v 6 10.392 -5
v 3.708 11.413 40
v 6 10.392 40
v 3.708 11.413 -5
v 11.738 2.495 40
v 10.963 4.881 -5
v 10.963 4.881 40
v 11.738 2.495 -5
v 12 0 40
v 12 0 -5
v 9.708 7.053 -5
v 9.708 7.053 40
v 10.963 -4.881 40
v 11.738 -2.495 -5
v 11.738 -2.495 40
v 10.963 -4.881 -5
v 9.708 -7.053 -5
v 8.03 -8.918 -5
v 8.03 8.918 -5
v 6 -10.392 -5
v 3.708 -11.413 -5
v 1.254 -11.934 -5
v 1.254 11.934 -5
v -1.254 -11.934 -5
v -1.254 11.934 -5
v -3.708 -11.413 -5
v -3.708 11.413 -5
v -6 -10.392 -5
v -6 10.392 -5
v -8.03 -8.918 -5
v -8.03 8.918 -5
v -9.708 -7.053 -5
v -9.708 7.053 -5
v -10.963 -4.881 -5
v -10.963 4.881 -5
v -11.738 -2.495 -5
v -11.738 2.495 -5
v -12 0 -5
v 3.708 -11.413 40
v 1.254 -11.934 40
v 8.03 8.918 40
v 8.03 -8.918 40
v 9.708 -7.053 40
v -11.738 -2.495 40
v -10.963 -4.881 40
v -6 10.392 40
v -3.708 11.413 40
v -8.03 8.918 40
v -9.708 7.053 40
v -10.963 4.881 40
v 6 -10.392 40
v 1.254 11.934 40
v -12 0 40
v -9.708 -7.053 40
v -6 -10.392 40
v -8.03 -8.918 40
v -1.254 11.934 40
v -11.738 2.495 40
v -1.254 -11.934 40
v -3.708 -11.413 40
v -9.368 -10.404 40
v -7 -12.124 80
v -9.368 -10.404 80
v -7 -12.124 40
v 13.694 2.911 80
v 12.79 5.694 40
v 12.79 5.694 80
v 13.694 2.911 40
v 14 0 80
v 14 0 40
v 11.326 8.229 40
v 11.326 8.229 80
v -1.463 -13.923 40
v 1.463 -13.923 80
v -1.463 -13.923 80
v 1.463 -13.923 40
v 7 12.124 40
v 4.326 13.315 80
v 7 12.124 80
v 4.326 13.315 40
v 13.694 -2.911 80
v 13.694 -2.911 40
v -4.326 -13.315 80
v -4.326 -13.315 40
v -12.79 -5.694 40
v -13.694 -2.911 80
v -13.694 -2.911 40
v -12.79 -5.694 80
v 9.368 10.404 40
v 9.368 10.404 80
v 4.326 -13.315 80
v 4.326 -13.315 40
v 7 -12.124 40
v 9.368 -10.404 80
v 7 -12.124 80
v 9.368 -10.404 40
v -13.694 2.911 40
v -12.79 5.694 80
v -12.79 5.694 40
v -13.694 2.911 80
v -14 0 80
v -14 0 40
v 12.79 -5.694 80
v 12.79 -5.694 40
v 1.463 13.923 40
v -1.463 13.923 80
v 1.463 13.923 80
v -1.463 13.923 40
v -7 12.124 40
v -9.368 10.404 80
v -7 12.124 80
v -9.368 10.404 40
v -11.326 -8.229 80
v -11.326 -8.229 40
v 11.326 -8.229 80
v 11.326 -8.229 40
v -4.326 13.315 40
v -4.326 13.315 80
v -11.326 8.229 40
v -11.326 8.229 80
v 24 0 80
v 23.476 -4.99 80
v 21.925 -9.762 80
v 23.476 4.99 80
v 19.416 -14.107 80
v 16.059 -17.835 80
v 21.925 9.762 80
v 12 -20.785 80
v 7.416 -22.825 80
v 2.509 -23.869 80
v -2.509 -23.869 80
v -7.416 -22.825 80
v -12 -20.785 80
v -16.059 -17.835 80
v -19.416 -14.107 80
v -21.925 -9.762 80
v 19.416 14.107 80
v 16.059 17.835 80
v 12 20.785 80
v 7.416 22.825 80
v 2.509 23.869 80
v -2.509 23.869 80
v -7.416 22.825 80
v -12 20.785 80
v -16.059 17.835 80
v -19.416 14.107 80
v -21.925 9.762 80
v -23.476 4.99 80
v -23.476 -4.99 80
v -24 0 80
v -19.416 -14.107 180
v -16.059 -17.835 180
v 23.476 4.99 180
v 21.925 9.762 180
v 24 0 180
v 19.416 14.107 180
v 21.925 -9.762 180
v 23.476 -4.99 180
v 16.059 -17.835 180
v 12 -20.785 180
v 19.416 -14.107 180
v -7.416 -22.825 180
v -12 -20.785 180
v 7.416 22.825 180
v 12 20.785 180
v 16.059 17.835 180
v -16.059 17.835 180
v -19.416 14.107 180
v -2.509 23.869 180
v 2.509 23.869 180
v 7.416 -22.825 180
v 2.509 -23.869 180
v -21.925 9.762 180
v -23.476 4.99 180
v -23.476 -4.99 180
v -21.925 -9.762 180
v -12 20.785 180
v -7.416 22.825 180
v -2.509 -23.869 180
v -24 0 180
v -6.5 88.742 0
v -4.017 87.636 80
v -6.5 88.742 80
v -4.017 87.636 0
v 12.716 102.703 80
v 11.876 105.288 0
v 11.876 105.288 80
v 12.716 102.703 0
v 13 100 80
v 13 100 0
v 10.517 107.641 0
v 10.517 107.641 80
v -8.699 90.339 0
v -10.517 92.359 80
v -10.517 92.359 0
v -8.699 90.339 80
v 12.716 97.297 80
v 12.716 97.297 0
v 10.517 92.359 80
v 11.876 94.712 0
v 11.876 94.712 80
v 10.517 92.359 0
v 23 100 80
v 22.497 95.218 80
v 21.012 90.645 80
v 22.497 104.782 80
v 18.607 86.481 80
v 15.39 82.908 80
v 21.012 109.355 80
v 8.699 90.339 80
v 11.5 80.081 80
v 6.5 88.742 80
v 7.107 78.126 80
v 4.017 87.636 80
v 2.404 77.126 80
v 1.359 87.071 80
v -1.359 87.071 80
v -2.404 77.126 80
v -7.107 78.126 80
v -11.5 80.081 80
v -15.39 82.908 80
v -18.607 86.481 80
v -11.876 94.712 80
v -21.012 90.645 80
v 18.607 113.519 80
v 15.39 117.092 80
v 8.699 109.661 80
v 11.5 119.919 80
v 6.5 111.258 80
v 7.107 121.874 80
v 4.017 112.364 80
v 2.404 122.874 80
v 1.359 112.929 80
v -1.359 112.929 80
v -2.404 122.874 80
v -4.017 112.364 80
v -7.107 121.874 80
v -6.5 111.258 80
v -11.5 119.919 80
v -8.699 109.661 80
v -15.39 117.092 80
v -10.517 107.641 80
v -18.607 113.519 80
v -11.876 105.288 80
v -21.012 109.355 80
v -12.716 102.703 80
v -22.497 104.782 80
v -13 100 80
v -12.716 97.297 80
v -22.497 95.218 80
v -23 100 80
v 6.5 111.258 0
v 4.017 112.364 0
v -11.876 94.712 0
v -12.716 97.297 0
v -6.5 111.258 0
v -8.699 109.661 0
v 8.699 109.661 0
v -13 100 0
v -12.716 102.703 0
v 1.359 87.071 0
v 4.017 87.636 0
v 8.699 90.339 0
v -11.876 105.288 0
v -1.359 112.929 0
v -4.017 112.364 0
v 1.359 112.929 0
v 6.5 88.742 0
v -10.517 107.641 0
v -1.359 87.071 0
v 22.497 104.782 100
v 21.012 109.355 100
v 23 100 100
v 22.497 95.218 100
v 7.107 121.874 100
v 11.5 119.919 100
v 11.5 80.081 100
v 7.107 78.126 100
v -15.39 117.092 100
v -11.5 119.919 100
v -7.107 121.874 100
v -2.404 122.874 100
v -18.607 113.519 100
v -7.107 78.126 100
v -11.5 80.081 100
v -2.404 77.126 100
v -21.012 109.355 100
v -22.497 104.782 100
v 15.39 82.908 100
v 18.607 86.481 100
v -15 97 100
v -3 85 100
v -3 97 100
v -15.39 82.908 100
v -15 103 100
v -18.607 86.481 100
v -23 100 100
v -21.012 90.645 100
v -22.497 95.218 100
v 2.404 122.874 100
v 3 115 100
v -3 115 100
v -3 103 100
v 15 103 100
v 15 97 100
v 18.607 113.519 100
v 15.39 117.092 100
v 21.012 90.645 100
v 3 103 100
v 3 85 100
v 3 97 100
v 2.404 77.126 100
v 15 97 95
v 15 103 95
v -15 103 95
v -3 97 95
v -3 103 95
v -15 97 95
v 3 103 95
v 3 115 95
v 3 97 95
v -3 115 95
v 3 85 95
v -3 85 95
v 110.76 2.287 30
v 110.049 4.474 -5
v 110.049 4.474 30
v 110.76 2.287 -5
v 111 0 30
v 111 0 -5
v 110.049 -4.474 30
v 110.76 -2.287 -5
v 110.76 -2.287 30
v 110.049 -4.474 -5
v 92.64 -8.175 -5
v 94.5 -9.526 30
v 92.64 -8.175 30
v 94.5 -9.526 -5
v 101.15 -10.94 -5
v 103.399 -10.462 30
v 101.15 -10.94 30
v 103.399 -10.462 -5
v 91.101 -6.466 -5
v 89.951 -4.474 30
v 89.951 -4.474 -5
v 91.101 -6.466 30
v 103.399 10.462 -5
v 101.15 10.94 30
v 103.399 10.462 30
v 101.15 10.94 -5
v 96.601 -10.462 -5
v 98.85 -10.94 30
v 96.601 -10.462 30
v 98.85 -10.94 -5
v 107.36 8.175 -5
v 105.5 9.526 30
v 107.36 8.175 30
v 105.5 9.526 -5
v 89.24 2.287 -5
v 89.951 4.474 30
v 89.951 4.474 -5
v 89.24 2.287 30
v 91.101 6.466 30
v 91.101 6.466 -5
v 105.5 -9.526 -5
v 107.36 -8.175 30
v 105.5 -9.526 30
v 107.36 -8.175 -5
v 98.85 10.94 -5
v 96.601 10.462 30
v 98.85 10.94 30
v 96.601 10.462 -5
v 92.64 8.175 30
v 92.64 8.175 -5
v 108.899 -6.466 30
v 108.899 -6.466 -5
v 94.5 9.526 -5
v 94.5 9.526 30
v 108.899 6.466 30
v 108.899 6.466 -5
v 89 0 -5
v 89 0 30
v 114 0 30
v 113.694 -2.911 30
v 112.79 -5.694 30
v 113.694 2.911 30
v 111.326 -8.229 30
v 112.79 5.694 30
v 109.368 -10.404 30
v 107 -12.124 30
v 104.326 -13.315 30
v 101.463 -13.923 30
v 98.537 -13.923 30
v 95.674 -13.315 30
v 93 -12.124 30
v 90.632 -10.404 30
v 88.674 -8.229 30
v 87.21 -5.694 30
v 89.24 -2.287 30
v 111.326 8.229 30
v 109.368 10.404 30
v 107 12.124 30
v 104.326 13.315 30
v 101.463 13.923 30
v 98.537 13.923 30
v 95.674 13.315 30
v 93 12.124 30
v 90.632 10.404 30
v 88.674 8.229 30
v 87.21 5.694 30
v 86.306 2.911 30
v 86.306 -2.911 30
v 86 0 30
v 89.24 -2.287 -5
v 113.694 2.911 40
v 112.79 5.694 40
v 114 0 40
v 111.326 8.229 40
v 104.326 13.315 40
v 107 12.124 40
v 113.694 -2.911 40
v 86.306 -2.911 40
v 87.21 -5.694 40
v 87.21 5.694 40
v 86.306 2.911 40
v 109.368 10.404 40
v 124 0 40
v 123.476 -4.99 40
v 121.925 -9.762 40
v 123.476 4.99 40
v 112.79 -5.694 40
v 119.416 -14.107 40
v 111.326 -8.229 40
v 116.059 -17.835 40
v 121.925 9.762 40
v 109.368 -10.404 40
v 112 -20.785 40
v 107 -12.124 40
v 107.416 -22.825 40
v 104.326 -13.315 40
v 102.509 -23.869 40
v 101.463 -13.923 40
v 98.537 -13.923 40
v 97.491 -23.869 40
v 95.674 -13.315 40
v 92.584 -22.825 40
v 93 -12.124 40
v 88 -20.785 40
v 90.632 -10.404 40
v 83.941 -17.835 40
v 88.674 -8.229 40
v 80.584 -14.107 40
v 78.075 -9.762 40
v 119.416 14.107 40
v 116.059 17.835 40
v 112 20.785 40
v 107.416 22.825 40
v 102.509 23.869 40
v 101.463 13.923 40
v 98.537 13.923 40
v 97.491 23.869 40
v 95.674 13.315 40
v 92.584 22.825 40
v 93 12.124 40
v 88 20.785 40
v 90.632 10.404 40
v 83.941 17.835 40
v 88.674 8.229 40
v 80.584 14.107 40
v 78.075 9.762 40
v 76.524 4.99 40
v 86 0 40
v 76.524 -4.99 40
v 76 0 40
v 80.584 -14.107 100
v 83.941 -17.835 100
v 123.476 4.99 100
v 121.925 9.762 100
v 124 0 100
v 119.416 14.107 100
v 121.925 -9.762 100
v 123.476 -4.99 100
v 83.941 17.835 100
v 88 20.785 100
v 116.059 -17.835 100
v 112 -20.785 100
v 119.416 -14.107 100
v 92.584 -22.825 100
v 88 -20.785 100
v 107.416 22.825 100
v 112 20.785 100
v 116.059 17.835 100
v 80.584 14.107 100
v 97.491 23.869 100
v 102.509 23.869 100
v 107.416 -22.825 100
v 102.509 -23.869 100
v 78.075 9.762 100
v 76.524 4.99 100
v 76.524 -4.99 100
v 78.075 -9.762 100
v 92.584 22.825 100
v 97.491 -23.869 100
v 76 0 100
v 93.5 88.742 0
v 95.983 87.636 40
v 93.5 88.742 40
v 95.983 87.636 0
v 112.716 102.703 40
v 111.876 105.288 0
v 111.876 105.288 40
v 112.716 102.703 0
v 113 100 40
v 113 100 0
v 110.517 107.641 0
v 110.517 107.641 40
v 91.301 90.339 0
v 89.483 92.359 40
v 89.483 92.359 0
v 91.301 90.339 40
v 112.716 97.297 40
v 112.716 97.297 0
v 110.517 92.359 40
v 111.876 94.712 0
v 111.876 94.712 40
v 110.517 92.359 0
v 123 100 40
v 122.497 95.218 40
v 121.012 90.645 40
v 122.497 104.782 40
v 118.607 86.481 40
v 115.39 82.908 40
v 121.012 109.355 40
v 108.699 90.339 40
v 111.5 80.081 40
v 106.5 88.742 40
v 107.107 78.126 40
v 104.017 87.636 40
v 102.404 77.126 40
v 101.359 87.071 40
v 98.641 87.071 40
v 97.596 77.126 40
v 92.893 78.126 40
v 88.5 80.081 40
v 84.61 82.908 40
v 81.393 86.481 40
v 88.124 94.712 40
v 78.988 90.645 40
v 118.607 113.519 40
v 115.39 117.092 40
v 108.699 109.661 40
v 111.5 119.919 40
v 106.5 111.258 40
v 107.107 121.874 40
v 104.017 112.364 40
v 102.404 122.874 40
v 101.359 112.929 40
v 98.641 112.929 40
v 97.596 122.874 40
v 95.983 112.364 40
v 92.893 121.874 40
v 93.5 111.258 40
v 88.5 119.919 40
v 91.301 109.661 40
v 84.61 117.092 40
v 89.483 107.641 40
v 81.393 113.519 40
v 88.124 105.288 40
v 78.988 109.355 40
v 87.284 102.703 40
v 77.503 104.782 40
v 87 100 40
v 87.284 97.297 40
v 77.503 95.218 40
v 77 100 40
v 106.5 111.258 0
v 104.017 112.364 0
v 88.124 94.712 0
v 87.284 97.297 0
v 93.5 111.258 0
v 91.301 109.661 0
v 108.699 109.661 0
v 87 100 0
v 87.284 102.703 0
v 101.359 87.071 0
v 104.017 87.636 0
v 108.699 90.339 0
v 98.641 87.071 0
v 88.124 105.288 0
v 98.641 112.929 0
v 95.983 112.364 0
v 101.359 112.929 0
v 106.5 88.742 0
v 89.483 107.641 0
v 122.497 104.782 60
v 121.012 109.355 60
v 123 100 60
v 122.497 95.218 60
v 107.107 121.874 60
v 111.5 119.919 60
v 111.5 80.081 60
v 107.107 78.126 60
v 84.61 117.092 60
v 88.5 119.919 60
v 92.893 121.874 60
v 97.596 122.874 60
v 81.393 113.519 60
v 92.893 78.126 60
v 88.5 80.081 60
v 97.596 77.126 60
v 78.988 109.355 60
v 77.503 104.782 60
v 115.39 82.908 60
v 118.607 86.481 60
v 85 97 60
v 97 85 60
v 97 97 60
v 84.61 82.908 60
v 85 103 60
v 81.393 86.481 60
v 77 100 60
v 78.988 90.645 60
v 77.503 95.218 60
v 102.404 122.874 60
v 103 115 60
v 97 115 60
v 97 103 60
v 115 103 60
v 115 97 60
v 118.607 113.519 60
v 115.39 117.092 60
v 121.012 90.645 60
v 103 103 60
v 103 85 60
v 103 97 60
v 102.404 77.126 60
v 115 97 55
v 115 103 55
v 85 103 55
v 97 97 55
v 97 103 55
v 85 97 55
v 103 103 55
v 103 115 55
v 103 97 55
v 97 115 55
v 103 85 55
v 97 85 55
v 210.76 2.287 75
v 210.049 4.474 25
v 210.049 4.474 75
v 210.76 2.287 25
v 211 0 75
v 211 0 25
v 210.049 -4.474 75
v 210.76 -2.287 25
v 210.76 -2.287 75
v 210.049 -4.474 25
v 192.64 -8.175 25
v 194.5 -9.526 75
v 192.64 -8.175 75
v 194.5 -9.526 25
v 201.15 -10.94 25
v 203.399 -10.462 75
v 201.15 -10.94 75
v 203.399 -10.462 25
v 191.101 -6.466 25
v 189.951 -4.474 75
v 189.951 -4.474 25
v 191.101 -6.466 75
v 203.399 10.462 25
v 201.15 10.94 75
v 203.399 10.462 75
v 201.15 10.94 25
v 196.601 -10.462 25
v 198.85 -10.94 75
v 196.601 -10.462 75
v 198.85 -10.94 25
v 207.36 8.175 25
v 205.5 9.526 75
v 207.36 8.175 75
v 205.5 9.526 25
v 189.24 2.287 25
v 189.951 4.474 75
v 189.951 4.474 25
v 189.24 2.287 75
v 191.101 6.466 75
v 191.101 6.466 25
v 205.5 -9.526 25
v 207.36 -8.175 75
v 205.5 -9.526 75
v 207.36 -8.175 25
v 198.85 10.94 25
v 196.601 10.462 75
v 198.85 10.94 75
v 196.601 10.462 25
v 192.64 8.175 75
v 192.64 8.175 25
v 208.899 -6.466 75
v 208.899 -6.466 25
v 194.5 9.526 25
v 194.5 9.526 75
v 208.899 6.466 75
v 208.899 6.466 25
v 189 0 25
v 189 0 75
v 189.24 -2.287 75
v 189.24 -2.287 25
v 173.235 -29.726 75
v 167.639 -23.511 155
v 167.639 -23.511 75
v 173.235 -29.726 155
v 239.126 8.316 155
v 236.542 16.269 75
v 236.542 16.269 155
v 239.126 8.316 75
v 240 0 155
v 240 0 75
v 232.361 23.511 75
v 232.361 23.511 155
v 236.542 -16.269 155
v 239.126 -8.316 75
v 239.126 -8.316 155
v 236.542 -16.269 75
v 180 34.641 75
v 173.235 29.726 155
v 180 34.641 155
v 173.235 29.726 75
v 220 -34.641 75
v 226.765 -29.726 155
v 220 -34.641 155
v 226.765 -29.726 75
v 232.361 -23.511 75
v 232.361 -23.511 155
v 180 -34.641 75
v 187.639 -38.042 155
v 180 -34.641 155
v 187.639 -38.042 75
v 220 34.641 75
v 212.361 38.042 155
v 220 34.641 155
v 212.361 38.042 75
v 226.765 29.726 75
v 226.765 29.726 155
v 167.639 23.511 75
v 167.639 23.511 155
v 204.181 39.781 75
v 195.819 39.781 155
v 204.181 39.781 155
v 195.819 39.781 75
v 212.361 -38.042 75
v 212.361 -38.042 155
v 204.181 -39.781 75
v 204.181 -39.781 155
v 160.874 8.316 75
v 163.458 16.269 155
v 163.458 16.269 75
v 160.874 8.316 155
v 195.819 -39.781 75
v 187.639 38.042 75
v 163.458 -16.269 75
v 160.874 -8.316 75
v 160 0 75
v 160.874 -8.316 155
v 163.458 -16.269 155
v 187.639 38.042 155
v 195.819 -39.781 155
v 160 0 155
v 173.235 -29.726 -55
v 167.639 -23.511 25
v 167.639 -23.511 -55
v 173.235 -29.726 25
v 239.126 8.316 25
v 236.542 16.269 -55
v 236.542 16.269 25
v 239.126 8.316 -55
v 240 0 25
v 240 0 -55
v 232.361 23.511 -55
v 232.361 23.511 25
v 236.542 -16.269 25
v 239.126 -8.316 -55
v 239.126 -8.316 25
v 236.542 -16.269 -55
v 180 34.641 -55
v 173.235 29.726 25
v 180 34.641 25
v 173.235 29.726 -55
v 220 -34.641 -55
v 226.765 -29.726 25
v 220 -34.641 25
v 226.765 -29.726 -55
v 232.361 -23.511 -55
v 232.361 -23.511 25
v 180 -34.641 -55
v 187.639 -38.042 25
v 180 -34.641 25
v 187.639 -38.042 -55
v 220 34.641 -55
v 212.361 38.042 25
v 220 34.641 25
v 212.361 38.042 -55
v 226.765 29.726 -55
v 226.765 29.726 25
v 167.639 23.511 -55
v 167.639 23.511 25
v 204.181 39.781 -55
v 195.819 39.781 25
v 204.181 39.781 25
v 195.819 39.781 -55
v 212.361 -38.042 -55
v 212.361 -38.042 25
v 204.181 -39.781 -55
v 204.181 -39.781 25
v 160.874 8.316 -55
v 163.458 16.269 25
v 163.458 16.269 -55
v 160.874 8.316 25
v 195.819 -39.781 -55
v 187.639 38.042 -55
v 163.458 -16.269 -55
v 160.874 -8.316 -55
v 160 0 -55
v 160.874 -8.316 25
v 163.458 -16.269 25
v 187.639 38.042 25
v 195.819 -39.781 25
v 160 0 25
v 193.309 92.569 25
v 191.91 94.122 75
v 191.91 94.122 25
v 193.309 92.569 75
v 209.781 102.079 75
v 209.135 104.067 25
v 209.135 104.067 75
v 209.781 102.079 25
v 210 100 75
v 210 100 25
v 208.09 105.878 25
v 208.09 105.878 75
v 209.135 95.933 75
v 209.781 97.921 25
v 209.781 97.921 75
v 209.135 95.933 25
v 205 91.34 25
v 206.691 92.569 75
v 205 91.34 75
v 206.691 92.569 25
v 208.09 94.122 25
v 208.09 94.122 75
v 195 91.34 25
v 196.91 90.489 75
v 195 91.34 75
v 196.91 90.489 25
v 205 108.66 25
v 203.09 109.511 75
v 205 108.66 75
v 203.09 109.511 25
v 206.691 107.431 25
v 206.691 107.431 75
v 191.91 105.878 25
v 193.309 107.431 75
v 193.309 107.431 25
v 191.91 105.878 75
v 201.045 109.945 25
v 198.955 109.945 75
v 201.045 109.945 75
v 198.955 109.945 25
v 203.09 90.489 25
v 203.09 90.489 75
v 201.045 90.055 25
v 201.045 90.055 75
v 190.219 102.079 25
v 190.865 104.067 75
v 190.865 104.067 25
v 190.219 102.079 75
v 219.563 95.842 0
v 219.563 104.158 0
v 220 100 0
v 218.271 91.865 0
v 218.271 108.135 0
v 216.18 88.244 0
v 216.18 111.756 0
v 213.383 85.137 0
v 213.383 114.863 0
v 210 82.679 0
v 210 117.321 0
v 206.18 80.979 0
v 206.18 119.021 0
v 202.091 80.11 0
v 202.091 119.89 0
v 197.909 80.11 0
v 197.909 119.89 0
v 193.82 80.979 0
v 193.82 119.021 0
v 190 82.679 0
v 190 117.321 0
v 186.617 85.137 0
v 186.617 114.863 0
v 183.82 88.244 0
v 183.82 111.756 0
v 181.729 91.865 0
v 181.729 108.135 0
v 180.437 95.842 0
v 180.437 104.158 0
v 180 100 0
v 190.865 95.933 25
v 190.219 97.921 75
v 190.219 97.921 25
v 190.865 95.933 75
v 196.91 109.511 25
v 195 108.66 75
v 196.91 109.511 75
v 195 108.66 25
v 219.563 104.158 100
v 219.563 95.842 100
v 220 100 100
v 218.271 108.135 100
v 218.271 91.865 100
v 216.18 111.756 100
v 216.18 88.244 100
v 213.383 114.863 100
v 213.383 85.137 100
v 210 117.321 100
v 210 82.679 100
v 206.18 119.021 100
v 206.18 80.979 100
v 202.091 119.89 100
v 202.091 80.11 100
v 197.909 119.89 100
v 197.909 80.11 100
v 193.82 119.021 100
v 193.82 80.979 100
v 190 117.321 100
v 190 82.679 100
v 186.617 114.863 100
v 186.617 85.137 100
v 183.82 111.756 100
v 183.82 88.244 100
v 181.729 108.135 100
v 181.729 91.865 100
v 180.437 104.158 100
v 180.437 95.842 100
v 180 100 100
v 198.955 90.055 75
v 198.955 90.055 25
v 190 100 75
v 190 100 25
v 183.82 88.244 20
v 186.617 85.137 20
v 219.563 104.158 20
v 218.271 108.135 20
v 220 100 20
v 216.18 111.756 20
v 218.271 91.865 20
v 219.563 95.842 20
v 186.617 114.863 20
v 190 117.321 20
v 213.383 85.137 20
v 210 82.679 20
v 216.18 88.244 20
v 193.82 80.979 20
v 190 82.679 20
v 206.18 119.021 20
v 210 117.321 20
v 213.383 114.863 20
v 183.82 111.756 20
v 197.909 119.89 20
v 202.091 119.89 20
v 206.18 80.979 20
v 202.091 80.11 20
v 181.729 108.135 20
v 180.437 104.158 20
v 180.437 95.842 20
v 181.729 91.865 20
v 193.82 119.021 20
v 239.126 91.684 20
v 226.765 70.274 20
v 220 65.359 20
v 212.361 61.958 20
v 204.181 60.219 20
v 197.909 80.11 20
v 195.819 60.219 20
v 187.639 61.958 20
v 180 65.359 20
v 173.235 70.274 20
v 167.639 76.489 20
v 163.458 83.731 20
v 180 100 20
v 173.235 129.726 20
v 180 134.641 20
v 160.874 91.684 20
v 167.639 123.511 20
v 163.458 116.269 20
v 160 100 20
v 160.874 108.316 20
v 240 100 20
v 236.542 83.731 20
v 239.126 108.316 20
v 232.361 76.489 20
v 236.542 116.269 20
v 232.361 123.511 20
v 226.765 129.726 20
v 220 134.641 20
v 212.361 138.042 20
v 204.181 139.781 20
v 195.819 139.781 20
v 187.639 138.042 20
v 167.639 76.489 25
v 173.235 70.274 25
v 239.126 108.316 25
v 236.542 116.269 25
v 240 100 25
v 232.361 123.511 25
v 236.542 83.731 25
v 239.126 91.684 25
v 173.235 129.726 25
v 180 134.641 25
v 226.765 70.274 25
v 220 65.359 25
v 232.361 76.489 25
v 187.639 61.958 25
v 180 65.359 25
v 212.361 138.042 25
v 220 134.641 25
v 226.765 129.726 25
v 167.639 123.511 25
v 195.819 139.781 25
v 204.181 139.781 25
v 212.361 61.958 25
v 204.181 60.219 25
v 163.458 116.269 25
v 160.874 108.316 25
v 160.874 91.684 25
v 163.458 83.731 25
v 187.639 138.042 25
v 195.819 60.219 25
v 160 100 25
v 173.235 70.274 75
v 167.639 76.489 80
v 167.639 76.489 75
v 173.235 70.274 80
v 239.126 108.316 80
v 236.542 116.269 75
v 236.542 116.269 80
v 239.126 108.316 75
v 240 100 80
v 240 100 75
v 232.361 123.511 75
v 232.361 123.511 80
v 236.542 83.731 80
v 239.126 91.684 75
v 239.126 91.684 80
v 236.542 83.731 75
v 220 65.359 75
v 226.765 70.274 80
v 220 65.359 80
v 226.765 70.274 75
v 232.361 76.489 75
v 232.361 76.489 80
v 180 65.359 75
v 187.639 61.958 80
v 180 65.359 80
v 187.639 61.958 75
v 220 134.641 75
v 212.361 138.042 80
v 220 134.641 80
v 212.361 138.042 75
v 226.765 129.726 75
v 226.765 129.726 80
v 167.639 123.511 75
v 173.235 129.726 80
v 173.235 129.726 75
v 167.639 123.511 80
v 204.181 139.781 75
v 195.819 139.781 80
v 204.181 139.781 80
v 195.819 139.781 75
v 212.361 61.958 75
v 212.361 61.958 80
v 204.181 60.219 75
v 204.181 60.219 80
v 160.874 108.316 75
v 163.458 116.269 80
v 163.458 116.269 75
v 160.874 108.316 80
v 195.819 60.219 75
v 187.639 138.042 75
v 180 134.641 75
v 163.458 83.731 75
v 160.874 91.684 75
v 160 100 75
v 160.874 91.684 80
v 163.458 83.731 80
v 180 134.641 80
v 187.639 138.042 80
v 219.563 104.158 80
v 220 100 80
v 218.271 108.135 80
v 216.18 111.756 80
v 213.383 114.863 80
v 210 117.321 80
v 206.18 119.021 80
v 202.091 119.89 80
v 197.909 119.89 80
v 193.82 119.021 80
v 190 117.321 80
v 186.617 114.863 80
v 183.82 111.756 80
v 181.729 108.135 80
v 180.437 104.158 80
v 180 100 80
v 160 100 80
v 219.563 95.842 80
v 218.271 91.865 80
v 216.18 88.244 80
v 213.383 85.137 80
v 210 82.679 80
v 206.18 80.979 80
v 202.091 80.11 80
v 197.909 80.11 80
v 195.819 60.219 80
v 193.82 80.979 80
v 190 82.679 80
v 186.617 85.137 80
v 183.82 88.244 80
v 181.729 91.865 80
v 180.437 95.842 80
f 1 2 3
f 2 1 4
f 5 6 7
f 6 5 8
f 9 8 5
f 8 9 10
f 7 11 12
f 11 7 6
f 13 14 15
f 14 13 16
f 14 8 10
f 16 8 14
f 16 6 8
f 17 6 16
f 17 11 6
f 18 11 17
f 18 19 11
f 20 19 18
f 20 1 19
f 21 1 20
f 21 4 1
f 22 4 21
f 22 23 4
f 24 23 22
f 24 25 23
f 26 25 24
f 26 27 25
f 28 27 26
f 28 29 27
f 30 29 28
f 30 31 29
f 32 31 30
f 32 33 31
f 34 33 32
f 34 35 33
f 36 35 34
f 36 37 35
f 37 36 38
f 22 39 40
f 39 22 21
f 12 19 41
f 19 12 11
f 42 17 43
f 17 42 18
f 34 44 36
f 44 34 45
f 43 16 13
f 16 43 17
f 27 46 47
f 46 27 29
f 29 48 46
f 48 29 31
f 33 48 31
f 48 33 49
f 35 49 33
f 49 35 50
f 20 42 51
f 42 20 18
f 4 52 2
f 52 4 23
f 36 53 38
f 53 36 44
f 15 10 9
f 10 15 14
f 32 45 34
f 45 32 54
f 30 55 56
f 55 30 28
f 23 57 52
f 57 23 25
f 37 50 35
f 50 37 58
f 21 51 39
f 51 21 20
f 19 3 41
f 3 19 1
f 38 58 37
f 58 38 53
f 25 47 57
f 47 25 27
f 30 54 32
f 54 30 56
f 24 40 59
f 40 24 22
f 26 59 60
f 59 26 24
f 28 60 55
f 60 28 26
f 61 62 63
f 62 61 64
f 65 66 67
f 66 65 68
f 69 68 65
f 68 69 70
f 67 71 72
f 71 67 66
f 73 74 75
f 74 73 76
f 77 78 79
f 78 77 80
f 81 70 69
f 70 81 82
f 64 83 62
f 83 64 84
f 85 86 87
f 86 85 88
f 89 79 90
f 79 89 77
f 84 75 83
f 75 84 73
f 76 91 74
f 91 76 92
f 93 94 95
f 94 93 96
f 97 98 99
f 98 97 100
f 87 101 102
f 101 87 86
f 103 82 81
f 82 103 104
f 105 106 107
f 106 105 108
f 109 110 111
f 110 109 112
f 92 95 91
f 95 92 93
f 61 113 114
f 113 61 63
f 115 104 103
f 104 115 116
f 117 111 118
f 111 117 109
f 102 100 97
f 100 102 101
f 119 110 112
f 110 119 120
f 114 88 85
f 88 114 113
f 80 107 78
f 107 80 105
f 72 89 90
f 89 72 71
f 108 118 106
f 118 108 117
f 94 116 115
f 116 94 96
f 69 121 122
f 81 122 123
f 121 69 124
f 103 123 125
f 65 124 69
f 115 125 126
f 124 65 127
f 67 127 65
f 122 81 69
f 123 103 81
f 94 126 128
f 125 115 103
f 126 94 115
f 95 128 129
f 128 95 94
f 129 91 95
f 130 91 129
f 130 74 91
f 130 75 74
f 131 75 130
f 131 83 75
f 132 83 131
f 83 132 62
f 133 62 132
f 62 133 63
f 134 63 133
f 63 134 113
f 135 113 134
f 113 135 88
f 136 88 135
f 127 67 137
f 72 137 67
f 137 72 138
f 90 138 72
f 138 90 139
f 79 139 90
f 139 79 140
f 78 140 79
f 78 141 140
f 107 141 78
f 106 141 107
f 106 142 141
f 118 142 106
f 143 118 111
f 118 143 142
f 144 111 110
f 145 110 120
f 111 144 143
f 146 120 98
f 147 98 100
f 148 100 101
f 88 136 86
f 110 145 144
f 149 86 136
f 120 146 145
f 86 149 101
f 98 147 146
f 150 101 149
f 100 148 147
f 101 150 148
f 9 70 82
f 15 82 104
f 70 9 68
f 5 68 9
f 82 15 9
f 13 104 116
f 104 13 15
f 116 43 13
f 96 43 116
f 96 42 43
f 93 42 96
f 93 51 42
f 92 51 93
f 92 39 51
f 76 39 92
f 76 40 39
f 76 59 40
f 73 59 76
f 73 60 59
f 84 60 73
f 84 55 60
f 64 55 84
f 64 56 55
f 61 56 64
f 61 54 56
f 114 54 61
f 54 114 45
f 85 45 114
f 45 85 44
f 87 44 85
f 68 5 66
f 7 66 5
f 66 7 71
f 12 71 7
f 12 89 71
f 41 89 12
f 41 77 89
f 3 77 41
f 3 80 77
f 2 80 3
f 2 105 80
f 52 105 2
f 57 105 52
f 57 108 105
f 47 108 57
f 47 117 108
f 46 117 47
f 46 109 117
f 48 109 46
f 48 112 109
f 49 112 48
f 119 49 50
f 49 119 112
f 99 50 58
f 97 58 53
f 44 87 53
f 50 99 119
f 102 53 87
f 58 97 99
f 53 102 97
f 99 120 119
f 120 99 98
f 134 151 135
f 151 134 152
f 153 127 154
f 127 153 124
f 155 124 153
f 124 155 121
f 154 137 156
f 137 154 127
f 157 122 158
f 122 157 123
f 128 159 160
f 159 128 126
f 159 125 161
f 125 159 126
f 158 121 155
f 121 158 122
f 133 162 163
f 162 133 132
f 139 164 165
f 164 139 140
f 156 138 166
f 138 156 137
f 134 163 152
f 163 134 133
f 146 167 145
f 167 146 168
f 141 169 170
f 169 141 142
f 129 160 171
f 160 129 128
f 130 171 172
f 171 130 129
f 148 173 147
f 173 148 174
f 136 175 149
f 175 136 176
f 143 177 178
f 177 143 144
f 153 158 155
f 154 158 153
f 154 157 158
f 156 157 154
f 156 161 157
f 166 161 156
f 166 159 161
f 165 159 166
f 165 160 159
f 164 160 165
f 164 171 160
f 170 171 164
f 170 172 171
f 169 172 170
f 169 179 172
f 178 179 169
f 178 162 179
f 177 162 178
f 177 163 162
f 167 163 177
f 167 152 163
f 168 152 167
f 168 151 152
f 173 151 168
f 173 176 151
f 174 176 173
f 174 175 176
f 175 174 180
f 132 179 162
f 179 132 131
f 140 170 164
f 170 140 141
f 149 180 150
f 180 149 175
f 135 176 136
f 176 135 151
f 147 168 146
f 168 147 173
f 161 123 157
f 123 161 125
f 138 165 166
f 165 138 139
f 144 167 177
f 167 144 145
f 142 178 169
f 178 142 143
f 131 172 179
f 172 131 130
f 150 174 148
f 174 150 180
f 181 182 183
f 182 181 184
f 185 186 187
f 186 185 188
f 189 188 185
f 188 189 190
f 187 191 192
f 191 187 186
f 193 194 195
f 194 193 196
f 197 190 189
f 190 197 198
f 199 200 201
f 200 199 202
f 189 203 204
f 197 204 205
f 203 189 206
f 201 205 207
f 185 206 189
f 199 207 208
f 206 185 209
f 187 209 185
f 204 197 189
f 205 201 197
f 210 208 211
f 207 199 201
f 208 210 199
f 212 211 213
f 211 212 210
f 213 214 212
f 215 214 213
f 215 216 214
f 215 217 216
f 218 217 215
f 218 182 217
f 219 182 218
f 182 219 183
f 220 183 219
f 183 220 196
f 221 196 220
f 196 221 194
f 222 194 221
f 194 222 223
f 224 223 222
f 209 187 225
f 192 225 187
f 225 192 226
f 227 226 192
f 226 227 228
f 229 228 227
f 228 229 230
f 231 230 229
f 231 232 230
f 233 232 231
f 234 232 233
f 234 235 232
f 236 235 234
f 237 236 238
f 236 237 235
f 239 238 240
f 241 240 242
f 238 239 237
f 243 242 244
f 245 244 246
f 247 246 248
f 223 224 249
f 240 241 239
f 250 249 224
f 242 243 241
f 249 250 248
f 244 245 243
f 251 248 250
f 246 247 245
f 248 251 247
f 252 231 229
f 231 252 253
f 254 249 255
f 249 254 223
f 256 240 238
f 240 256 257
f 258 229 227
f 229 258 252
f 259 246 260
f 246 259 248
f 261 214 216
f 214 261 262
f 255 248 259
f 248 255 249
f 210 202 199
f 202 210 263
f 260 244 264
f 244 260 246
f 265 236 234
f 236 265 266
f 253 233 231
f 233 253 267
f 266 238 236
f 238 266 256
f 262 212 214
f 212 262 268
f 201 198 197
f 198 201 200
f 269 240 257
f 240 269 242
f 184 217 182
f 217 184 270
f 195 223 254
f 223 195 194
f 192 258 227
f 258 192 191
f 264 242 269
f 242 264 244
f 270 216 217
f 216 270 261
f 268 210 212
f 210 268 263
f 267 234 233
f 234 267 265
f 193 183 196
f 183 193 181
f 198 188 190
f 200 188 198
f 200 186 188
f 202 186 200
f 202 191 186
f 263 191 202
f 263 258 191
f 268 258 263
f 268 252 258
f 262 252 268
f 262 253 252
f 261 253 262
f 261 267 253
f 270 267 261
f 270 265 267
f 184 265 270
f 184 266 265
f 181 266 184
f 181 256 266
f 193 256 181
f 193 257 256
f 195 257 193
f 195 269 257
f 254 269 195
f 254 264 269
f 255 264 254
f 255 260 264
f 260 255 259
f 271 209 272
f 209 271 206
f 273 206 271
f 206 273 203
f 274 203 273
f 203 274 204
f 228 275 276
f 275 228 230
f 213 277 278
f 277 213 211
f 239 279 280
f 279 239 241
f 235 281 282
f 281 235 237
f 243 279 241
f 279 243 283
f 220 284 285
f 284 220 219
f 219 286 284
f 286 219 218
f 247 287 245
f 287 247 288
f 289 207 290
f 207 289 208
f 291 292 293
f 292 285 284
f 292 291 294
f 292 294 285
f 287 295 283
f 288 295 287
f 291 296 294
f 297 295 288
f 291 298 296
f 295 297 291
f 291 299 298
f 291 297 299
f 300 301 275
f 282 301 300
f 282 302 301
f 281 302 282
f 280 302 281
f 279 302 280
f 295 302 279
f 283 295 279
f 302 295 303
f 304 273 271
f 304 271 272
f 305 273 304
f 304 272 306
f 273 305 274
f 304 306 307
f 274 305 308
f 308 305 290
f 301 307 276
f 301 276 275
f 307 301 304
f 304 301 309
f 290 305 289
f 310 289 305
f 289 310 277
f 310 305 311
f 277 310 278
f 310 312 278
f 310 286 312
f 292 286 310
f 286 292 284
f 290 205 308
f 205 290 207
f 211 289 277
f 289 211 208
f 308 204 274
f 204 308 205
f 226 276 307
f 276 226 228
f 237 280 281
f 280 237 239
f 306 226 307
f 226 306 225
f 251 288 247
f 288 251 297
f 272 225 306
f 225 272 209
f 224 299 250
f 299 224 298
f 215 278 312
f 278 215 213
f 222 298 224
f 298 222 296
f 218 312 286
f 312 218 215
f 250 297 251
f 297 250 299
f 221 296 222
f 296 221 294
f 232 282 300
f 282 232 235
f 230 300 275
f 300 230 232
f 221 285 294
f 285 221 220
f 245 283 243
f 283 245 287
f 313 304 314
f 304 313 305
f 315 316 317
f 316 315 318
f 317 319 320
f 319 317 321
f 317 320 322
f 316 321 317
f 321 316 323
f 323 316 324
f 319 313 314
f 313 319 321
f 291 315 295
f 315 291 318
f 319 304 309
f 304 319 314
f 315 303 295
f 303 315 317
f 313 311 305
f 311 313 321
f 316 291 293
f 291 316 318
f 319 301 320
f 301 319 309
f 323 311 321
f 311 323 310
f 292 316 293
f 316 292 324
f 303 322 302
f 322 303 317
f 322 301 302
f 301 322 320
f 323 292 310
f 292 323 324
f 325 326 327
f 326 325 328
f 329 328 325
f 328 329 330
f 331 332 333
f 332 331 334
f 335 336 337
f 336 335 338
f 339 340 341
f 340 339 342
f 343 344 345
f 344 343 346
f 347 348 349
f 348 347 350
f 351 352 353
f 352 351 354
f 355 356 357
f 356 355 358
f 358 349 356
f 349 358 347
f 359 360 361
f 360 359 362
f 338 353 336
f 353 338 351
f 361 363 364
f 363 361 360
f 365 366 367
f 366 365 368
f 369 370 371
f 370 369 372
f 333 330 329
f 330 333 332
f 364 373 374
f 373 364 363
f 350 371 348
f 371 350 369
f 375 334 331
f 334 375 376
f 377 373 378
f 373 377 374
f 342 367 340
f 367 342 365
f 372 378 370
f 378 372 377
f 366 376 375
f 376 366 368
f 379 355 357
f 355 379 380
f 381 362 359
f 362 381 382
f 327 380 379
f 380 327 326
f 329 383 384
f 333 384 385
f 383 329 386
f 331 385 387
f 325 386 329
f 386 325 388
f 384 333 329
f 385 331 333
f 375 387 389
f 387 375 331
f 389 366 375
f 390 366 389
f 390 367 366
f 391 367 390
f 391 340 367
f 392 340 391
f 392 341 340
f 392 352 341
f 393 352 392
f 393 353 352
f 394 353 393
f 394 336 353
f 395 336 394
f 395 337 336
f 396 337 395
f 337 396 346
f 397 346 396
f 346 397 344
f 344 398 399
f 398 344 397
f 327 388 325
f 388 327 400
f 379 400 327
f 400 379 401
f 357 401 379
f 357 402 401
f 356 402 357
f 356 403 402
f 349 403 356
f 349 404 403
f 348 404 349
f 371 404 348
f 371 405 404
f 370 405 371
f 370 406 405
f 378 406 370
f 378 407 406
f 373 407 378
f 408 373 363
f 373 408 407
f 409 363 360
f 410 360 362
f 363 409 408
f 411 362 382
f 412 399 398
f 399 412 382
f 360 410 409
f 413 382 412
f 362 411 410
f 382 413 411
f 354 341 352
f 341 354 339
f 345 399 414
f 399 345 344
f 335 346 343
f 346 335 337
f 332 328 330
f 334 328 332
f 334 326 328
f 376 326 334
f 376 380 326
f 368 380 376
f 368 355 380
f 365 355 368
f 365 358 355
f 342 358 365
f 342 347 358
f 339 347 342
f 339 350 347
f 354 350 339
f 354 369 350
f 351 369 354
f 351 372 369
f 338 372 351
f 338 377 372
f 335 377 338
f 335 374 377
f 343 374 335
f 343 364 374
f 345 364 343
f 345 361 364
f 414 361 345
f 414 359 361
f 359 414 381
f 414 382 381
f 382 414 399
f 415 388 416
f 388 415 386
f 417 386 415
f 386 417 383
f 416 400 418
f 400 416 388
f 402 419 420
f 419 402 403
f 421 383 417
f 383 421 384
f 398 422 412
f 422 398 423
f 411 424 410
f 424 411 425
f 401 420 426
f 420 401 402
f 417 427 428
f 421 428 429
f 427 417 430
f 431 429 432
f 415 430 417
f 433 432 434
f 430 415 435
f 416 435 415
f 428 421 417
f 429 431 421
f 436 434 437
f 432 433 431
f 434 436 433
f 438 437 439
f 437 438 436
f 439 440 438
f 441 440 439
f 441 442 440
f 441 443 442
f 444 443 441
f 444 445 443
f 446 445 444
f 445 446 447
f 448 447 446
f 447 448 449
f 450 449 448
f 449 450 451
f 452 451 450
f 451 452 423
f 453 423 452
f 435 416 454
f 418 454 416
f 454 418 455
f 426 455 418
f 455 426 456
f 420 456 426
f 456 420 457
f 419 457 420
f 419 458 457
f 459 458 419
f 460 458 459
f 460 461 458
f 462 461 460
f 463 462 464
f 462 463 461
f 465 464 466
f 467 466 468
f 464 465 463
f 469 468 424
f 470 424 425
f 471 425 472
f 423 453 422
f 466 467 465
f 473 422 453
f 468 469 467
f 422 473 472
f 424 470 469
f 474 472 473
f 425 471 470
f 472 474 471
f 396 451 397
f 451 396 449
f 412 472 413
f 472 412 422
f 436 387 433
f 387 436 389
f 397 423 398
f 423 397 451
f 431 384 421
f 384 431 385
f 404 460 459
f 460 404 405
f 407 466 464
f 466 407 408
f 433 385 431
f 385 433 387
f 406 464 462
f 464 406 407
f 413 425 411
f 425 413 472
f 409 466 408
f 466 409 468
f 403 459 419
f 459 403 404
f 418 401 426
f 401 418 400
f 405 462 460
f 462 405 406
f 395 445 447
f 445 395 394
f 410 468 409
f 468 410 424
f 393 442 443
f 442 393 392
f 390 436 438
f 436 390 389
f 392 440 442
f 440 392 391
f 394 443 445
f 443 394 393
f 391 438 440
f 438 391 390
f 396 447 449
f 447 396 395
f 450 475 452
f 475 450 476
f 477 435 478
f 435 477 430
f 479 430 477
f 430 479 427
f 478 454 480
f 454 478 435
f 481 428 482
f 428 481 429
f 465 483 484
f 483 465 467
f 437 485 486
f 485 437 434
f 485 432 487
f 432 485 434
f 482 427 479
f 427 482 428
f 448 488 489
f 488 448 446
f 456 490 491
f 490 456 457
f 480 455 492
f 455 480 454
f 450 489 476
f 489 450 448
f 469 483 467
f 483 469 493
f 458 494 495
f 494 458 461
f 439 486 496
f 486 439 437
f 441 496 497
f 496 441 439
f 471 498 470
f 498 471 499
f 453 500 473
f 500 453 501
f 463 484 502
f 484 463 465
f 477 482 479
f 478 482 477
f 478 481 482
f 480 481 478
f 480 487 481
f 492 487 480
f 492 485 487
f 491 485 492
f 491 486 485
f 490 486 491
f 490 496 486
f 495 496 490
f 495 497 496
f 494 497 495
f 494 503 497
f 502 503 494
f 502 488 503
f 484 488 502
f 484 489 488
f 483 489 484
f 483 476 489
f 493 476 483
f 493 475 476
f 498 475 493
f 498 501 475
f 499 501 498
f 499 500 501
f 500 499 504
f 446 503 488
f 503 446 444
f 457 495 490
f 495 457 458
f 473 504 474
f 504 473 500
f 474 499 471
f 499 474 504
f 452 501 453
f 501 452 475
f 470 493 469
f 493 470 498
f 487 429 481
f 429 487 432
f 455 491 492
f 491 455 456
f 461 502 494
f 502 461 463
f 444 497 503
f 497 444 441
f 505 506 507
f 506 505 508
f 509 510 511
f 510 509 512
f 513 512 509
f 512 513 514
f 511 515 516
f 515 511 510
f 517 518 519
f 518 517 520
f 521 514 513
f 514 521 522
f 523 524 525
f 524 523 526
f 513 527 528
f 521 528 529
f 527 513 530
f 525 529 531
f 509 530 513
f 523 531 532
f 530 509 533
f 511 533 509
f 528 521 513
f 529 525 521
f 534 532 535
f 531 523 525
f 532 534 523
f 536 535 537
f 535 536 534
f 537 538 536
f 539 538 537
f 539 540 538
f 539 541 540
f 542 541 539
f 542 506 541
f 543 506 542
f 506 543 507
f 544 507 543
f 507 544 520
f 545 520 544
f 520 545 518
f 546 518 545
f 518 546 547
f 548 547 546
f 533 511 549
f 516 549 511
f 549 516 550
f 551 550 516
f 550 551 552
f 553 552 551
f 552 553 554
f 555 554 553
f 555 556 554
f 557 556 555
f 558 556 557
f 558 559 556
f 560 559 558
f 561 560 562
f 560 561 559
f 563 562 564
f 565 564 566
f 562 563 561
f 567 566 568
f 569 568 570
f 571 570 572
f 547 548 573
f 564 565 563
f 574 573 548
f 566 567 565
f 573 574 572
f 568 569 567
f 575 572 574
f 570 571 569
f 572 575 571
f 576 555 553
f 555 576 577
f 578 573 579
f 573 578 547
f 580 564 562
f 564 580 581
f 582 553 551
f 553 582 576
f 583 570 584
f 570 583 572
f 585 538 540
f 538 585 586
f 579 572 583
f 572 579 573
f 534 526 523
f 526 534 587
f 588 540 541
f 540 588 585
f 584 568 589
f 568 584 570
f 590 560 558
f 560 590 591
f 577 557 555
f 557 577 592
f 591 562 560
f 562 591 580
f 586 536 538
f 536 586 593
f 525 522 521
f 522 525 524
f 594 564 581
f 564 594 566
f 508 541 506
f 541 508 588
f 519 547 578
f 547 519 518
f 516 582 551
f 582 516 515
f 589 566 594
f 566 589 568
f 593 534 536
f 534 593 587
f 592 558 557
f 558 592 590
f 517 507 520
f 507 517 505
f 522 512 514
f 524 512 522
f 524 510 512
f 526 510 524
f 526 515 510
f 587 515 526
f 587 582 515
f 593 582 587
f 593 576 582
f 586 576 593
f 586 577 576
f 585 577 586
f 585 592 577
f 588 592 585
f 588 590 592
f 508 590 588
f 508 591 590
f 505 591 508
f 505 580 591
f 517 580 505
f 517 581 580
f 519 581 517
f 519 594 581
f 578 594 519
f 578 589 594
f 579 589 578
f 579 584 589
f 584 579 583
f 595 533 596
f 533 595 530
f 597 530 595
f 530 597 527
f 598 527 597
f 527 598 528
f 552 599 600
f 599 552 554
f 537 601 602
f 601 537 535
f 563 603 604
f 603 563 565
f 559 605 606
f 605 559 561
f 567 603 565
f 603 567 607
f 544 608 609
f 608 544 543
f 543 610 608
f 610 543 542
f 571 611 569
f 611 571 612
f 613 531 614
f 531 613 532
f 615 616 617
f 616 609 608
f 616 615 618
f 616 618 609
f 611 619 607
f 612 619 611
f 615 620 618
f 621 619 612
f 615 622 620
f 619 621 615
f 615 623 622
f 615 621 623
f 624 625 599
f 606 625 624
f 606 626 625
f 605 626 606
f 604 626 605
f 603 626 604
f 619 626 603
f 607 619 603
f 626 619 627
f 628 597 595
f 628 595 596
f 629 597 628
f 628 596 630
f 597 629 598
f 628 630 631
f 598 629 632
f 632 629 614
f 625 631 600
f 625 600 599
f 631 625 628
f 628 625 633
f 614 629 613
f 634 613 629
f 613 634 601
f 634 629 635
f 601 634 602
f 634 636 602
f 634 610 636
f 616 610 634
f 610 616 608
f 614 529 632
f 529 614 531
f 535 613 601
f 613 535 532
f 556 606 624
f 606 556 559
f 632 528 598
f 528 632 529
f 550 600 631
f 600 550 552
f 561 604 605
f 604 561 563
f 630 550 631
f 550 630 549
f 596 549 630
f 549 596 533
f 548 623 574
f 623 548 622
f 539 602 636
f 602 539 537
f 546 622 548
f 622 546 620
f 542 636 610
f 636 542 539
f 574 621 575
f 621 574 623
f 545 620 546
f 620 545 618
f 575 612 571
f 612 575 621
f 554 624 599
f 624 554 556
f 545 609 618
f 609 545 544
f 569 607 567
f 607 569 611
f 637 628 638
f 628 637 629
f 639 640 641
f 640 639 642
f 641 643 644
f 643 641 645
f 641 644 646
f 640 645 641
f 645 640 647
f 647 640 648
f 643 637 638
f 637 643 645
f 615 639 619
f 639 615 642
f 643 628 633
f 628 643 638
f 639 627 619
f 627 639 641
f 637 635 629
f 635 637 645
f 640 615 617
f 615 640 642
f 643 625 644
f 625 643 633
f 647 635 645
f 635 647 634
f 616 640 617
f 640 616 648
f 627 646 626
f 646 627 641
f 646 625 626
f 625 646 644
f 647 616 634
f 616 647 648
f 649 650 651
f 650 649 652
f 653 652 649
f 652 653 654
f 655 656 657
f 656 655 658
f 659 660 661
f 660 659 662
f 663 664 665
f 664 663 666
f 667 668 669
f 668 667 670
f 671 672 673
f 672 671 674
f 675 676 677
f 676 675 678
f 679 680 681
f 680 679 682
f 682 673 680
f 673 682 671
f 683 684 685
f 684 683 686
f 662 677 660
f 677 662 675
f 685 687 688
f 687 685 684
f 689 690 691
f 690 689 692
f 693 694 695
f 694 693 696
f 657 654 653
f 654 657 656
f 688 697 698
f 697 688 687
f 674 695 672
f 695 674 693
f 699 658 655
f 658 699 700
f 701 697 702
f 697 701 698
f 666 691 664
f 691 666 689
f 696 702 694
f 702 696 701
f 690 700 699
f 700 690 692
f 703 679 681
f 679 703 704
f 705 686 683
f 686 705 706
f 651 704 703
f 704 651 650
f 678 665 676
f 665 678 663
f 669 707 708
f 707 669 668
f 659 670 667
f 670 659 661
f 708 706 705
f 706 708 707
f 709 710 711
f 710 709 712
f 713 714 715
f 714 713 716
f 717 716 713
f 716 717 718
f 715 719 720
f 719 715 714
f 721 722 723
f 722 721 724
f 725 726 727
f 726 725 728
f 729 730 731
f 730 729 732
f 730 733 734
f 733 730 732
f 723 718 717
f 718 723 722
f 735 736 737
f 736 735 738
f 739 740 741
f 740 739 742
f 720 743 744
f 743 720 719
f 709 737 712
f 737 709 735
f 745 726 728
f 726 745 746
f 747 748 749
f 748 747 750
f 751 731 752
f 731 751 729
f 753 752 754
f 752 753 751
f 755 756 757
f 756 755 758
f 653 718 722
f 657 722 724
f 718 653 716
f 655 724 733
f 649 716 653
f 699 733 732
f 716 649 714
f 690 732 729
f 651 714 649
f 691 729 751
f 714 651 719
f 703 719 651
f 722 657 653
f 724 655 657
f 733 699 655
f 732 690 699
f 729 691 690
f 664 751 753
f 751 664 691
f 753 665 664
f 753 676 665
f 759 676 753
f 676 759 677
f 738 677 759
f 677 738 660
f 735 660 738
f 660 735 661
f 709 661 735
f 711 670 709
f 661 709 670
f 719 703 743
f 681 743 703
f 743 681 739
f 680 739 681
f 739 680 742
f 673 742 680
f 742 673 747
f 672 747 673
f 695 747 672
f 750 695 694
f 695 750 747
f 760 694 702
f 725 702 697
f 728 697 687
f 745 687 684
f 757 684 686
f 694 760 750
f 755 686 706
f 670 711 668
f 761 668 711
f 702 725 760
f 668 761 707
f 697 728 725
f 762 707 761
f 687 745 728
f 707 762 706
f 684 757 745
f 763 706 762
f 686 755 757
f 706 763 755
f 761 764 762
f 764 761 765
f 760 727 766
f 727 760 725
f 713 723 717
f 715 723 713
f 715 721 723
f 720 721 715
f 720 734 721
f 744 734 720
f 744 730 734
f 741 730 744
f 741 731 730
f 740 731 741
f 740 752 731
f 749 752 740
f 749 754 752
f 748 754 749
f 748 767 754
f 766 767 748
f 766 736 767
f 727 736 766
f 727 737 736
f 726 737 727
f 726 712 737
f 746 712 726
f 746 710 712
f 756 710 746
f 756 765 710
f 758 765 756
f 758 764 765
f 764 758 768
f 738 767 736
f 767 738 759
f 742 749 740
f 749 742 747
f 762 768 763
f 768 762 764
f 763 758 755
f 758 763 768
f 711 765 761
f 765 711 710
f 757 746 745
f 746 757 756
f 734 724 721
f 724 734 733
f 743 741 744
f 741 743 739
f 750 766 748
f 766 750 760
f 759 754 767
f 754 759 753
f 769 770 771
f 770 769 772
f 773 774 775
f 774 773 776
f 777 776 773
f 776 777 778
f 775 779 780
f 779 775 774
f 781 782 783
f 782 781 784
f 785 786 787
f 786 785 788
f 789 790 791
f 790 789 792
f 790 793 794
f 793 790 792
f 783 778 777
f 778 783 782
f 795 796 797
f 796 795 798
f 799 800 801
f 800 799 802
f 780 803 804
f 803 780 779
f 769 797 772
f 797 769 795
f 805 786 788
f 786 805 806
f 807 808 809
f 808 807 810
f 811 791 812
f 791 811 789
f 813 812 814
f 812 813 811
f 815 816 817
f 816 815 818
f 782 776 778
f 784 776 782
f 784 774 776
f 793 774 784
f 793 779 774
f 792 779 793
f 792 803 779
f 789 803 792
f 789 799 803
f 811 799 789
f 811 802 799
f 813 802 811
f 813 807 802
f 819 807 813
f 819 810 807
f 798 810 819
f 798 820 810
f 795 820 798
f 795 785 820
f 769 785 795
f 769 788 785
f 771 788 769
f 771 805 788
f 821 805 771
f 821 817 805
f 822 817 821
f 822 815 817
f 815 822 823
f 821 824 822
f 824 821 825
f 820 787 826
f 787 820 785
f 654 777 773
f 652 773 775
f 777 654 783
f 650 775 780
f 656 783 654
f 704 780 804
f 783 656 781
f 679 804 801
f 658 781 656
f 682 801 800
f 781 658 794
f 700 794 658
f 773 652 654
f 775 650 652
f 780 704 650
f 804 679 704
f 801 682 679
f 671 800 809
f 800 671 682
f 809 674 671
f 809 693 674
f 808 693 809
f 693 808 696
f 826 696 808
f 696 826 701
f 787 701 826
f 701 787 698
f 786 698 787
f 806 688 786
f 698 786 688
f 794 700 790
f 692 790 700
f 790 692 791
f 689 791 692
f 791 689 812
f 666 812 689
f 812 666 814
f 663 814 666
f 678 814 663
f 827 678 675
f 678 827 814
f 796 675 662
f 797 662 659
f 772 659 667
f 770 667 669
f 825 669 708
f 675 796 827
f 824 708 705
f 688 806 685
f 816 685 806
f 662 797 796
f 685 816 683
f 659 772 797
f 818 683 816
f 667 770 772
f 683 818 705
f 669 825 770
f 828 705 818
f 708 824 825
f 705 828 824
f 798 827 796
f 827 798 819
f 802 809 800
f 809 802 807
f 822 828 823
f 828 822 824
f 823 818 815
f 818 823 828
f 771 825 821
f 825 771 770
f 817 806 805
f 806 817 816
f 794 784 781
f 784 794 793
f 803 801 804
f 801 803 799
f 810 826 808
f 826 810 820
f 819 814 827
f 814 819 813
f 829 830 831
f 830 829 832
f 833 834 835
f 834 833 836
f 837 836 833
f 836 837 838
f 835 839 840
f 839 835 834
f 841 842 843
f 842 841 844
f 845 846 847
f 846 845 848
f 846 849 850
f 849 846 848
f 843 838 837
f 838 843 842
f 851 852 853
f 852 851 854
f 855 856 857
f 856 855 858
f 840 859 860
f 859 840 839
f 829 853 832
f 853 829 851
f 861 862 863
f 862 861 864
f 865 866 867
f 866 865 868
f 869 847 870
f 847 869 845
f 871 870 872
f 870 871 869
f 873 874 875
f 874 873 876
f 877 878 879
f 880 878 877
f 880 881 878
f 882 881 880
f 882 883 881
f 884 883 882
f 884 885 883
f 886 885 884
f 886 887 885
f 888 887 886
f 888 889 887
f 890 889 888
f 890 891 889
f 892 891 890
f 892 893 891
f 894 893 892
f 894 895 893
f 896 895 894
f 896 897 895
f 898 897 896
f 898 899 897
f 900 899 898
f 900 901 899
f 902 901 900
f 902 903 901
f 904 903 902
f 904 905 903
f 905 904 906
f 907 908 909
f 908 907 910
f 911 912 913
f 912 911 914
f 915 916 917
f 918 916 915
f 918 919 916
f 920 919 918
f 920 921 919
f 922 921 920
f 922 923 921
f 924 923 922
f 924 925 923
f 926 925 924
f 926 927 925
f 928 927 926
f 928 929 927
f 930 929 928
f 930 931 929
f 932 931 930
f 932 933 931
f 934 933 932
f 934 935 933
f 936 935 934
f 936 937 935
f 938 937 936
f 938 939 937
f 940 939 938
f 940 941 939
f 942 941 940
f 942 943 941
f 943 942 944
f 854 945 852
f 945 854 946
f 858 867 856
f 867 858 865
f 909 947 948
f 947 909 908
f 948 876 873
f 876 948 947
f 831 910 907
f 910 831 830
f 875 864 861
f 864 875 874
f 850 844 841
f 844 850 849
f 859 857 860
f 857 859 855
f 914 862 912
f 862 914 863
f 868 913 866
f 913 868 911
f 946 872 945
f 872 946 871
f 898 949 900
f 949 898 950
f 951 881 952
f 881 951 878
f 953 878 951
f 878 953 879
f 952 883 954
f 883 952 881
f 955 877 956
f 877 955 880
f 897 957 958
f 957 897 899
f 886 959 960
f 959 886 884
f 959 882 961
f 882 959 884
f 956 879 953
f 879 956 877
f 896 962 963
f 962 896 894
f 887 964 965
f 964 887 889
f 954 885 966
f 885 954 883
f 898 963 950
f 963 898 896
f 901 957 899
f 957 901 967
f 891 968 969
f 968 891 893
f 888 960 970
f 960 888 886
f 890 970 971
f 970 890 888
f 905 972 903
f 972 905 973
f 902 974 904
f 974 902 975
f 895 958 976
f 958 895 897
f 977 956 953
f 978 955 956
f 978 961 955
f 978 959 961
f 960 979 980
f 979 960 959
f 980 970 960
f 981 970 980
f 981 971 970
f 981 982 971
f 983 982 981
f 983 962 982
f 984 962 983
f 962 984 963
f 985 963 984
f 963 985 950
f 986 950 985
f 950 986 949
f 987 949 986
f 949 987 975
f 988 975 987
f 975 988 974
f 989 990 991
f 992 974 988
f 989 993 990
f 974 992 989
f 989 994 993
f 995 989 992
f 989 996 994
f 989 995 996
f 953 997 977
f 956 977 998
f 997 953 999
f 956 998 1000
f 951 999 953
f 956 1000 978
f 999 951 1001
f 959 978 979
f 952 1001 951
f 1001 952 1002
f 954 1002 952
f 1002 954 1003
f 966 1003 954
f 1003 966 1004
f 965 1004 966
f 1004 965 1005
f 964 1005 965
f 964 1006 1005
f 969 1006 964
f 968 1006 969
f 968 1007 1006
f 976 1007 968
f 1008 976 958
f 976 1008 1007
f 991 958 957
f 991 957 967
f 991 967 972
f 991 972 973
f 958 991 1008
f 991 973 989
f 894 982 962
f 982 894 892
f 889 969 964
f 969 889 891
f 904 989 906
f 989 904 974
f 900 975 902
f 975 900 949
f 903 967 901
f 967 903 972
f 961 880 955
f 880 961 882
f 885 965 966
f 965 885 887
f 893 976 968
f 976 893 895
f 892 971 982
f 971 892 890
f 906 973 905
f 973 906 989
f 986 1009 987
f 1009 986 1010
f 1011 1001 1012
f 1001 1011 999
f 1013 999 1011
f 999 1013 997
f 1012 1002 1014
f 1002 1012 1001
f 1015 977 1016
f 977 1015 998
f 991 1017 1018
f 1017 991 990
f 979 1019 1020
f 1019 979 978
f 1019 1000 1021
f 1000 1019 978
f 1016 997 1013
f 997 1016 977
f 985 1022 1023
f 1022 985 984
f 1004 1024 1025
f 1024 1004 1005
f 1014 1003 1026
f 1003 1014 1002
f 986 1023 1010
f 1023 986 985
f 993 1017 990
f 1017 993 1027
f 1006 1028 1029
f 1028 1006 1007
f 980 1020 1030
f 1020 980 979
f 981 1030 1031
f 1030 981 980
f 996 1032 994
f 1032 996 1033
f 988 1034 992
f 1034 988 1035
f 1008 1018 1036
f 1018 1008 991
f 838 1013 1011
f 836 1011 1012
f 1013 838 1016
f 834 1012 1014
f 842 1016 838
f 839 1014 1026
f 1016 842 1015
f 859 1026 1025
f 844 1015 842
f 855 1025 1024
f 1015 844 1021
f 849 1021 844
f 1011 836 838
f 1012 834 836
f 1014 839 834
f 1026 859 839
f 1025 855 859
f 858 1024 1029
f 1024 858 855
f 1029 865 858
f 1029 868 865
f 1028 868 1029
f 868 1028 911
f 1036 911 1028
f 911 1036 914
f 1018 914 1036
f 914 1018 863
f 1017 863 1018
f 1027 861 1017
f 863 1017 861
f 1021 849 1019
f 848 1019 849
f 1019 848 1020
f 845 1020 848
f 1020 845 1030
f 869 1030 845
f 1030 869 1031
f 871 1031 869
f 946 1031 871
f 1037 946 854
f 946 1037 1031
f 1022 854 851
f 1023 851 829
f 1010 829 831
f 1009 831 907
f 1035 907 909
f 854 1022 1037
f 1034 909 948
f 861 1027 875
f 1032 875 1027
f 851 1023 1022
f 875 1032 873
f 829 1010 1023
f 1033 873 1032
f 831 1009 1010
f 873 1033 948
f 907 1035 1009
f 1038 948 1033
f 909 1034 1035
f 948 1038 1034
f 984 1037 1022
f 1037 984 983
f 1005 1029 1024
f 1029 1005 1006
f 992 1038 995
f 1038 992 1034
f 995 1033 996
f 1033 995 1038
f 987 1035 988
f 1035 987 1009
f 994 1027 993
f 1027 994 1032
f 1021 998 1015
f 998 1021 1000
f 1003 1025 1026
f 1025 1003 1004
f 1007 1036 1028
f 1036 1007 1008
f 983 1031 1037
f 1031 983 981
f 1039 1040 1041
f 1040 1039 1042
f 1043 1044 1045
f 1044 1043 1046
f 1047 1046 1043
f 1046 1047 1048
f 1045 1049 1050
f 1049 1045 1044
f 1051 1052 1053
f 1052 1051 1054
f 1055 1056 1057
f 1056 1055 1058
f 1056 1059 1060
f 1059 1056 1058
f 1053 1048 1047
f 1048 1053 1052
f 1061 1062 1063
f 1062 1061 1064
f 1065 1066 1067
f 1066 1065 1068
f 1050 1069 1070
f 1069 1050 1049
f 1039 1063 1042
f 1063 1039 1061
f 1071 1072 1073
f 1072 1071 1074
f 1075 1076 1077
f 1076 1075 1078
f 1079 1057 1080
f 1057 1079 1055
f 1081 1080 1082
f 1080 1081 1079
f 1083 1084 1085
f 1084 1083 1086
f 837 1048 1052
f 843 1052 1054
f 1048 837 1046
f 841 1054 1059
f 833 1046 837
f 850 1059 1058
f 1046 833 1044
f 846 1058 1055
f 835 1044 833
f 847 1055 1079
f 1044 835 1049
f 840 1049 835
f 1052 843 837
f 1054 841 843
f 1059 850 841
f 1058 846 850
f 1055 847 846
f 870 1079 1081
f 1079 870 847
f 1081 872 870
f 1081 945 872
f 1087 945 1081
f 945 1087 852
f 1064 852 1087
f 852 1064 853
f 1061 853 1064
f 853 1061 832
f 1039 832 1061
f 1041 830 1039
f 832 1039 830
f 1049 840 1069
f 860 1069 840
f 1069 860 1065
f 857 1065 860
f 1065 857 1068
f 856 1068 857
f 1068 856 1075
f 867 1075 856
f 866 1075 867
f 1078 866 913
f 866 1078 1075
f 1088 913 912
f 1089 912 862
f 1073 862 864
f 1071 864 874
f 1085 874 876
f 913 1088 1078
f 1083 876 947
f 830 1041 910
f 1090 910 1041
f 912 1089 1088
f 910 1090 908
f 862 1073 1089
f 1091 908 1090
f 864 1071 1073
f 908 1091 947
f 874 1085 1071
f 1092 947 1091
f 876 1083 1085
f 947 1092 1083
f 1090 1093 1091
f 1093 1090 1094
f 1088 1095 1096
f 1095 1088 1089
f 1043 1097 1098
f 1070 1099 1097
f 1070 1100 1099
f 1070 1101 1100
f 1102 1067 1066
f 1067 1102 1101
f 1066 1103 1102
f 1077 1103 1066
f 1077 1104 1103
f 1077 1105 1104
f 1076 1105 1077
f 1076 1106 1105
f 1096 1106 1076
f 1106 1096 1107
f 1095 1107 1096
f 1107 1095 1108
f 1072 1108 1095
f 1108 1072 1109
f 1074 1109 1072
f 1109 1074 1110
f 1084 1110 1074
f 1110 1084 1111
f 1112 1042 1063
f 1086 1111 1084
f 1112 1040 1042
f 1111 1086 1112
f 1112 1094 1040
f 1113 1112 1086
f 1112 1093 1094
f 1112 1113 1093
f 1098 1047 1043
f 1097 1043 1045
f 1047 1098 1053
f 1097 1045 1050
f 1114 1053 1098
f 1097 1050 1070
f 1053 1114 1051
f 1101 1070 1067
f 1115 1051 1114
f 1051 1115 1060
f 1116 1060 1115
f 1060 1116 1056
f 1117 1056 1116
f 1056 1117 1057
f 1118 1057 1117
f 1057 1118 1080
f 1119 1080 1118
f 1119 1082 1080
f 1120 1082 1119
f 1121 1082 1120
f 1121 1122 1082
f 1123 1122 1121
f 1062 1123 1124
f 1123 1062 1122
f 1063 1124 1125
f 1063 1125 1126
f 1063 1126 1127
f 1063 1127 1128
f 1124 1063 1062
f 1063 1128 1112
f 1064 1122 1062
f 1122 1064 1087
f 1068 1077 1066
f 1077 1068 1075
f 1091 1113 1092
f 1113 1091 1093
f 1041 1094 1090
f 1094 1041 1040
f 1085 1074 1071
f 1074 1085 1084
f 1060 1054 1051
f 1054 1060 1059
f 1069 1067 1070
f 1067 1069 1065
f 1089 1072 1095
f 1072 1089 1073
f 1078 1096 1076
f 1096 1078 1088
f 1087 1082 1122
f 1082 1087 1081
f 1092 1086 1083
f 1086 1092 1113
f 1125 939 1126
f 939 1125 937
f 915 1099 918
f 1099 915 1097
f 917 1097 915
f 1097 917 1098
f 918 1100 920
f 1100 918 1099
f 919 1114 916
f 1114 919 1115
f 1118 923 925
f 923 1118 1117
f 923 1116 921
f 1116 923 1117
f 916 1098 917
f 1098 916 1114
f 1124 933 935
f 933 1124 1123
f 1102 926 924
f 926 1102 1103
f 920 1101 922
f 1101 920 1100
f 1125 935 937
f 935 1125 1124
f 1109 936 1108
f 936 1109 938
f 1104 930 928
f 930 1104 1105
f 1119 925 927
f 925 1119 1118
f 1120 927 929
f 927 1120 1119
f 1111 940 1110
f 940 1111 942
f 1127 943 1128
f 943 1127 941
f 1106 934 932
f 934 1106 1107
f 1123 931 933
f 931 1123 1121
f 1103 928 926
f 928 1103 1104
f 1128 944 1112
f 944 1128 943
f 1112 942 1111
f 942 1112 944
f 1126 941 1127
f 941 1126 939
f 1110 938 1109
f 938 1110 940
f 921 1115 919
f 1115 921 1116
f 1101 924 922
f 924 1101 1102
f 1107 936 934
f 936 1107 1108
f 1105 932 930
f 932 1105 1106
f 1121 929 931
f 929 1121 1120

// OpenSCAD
screw8_hole();

translate([0,100,0]) screw8();

translate([100,0,0]) screw4_hole();

translate([100,100,0]) screw4();

translate([200,0,0]) m2_50_hole();

translate([200,100,0]) m2_50();

module m2_50() {
  color("Silver") {
    union() {
      cylinder(100,10,10);
      cylinder(20,20,20);
      translate([0,0,20]) cylinder(5,40,40);
      translate([0,0,75]) cylinder(5,40,40);
      translate([0,0,80]) cylinder(20,20,20);
    }
  }
}

module m2_50_hole() {
    union() {
      cylinder(100,11,11);
      translate([0,0,75]) cylinder(80,40,40);
      translate([0,0,-55]) cylinder(80,40,40);
    }
}

module screw8_hole() {
  // screw protrudes 5 clearance
  union() {
    translate([ 0,0,-5]) cylinder(75,12,12);
    translate([0,0,40]) cylinder(40,14,14);
    translate([0,0,80]) cylinder(100,24,24);
  }
}

module screw4_hole() {
  // screw protrudes 5 clearance
  union() {
    translate([ 0,0,-5]) cylinder(35,11,11);
    translate([0,0,30]) cylinder(10,14,14);
    translate([0,0,40]) cylinder(60,24,24);
  }
}


module screw4() {
  color("Silver") {
    difference() {
      union() {
        cylinder(40,13,13);
        translate([0,0,40]) cylinder(20,23,23);
      }
    translate([-15,-3,55]) cube([30,6,6]);
    translate([-3,-15,55]) cube([6,30,6]);
    }
  }
}

module screw8() {
  color("Silver") {
    difference() {
      union() {
        cylinder(80,13,13);
        translate([0,0,80]) cylinder(20,23,23);
      }
    translate([-15,-3,95]) cube([30,6,6]);
    translate([-3,-15,95]) cube([6,30,6]);
    }
  }
}
